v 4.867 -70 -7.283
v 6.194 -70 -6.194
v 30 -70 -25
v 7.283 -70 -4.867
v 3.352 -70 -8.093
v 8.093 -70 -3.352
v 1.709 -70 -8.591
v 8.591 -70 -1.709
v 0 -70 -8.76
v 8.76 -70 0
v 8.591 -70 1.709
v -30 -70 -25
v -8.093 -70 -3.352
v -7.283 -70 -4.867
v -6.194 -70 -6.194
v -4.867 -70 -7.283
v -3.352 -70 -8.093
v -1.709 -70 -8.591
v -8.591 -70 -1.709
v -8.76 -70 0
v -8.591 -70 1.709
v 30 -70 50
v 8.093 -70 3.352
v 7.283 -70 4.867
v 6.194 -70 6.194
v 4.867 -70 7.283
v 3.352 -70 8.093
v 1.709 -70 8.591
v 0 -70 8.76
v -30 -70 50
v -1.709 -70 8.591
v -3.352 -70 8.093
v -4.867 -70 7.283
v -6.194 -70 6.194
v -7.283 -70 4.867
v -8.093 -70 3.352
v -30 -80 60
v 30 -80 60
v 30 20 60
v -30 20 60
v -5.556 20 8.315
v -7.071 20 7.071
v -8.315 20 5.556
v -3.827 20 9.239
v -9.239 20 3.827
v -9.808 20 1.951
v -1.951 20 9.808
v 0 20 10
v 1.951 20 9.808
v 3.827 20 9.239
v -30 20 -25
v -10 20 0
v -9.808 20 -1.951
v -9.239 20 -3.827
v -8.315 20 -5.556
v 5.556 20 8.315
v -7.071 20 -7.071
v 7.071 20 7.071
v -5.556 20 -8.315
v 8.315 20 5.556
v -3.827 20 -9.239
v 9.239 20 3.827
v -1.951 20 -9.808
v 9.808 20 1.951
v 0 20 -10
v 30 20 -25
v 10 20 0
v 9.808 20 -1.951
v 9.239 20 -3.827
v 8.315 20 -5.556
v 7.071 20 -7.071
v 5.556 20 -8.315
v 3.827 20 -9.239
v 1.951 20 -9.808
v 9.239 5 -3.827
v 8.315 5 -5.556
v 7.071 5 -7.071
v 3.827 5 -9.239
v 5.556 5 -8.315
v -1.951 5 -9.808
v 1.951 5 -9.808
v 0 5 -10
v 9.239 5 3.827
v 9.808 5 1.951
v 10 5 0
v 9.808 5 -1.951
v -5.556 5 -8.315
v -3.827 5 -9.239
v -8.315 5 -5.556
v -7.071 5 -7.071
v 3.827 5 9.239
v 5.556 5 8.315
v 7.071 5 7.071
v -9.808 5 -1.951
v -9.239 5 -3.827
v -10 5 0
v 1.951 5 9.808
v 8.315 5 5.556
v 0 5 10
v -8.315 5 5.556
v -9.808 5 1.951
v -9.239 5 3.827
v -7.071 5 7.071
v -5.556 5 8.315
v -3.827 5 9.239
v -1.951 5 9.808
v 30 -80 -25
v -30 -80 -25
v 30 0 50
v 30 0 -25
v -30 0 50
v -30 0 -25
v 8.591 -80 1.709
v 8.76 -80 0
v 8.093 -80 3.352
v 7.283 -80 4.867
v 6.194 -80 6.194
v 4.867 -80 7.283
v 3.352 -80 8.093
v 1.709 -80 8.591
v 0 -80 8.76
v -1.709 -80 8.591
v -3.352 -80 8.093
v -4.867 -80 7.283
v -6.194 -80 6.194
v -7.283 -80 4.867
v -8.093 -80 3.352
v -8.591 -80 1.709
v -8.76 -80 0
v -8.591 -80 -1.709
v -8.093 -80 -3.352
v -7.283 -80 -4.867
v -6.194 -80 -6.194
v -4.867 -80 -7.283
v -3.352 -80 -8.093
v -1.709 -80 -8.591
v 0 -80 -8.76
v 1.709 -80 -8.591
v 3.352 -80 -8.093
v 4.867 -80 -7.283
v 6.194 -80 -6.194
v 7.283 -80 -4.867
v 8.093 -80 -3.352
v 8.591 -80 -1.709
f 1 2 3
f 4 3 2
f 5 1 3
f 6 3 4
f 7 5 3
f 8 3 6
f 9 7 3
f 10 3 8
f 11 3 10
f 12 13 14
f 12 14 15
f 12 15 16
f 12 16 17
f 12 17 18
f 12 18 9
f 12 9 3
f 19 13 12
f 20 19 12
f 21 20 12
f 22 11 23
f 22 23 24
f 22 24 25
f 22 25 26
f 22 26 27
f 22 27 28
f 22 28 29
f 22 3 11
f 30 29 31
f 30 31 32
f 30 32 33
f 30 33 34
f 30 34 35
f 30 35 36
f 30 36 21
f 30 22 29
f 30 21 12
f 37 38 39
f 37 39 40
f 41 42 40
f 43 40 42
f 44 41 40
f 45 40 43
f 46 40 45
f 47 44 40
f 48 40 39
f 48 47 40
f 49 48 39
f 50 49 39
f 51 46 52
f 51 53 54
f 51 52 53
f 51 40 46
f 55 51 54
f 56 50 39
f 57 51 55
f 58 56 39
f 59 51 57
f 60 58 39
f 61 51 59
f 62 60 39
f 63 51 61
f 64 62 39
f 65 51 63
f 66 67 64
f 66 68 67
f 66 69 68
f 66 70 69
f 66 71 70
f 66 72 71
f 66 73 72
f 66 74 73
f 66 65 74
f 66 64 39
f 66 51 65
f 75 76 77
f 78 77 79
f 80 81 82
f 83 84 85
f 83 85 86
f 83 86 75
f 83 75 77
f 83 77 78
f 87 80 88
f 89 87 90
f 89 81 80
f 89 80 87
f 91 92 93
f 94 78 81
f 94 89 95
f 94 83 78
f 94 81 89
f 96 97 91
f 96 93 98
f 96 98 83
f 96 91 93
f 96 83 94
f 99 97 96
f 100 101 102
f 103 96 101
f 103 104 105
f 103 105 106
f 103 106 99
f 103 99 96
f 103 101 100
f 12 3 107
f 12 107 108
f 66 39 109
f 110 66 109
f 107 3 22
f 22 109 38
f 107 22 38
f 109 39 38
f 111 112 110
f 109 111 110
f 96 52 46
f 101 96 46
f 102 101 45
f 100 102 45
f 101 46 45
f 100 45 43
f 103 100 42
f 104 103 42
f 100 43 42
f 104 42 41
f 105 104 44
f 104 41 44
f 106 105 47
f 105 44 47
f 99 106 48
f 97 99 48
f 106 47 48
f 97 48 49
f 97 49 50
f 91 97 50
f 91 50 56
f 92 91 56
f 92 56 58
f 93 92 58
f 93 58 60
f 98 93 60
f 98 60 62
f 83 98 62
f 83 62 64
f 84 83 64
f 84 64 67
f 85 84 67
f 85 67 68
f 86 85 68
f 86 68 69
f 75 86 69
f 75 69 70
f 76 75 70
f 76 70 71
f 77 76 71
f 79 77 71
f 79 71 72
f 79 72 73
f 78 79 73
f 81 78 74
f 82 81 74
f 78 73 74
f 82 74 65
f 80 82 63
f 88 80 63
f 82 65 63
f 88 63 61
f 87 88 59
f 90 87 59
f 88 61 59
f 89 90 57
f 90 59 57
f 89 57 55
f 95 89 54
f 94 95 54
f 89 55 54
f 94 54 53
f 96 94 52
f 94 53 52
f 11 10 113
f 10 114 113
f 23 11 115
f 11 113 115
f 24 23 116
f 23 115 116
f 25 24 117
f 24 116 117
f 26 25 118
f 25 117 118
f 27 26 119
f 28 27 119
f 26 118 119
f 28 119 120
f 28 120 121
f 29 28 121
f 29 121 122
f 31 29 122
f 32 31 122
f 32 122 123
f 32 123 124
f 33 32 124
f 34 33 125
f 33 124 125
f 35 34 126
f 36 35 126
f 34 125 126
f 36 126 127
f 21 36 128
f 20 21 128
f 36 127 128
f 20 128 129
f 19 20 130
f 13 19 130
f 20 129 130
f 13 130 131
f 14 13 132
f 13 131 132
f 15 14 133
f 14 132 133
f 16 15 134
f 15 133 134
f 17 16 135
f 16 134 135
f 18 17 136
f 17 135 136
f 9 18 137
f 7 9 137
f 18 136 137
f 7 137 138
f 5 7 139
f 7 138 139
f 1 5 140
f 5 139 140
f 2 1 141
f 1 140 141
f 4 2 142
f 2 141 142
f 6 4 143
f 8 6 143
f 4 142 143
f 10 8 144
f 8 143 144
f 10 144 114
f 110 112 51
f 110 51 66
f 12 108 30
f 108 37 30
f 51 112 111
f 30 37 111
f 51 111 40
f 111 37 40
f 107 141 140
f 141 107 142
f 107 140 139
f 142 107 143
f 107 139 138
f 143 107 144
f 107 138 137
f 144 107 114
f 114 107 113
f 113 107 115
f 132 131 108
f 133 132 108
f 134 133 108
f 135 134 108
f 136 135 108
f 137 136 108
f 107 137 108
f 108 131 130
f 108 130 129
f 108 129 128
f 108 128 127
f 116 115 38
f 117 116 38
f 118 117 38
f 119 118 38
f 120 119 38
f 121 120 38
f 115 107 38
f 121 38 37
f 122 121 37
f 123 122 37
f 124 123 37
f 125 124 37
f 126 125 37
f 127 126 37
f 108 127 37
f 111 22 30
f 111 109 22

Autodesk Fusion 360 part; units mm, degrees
sketch "草图1" plane through (0, 0, 0) normal (0, 1, 0) x (1, 0, 0) in component "Component"
  line L0 (-30, 25) -> (30, 25)
  line L1 (30, 25) -> (30, -60)
  line L2 (30, -60) -> (-30, -60)
  line L3 (-30, -60) -> (-30, 25)
  dimension "d1" = 60
  dimension "d2" = 85
  dimension "d3" = 25
  dimension "d4" = 30
extrude "拉伸1" add sketch "草图1" along normal blind 10 in component "Component"
sketch "草图2" plane through (0, 0, 0) normal (0, -1, 0) x (1, 0, 0) in component "Component"
  line L0 (30, 60) -> (-30, 60)
  line L1 (-30, 60) -> (-30, -25)
  line L2 (-30, -25) -> (30, -25)
  line L3 (30, -25) -> (30, 60)
  line L4 (-30, 60) -> (30, 60)
  line L5 (30, 60) -> (30, 50)
  line L6 (30, 50) -> (-30, 50)
  line L7 (-30, 50) -> (-30, 60)
  dimension "d8" = 10
extrude "拉伸2" add sketch "草图2" along normal blind 80 contours L0 L1 L3 L4 L5 L6 L7 in component "Component"
sketch "草图3" plane through (0, 0, 50) normal (0, 0, -1) x (-1, 0, 0) in component "Component"
  line L0 (30, 0) -> (-30, 0)
  line L1 (-30, 0) -> (-30, -80)
  line L2 (-30, -80) -> (30, -80)
  line L3 (30, -80) -> (30, 0)
  line L4 (-30, -70) -> (30, -70)
  line L5 (30, -70) -> (30, -80)
  line L6 (30, -80) -> (-30, -80)
  line L7 (-30, -80) -> (-30, -70)
  dimension "d11" = 10
extrude "拉伸3" add sketch "草图3" along normal blind 75 contours L1 L2 L3 L4 L5 L6 L7 in component "Component"
sketch "草图4" plane through (0, -80, 0) normal (0, -1, 0) x (1, 0, 0) in component "Component"
  line L0 (30, -25) -> (30, 60)
  line L1 (30, 60) -> (-30, 60)
  line L2 (-30, 60) -> (-30, -25)
  line L3 (-30, -25) -> (30, -25)
  circle A0 centre (0, 0) radius 10
  dimension "d14" = 20
extrude "拉伸4" cut sketch "草图4" against normal blind 10 contours A0 in component "Component"
thread "螺纹1" "ISO Metric profile 20.0 M20x2.5 6H" major diameter 20.2925 minor diameter 17.519 pitch 2.5 angle 60 resizes the face on face at (9.9876, -73.3333, -0.4985) in component "Component"
extrude "拉伸5" add 1 faces at (-10, 10, 3.3333) along direction (0, 1, 0) blind 10 in component "Component"
sketch "草图5" plane through (0, 20, 0) normal (0, 1, 0) x (-1, 0, 0) in component "Component"
  line L0 (30, 60) -> (-30, 60)
  line L1 (-30, 60) -> (-30, -25)
  line L2 (-30, -25) -> (30, -25)
  line L3 (30, -25) -> (30, 60)
  circle A0 centre (0, 0) radius 10
extrude "拉伸6" cut sketch "草图5" against normal blind 15 contours A0 in component "Component"
component "Component" placed x (1, 0, 0) y (0, 1, 0) z (0, 0, 1) at (0, 0, 0)
